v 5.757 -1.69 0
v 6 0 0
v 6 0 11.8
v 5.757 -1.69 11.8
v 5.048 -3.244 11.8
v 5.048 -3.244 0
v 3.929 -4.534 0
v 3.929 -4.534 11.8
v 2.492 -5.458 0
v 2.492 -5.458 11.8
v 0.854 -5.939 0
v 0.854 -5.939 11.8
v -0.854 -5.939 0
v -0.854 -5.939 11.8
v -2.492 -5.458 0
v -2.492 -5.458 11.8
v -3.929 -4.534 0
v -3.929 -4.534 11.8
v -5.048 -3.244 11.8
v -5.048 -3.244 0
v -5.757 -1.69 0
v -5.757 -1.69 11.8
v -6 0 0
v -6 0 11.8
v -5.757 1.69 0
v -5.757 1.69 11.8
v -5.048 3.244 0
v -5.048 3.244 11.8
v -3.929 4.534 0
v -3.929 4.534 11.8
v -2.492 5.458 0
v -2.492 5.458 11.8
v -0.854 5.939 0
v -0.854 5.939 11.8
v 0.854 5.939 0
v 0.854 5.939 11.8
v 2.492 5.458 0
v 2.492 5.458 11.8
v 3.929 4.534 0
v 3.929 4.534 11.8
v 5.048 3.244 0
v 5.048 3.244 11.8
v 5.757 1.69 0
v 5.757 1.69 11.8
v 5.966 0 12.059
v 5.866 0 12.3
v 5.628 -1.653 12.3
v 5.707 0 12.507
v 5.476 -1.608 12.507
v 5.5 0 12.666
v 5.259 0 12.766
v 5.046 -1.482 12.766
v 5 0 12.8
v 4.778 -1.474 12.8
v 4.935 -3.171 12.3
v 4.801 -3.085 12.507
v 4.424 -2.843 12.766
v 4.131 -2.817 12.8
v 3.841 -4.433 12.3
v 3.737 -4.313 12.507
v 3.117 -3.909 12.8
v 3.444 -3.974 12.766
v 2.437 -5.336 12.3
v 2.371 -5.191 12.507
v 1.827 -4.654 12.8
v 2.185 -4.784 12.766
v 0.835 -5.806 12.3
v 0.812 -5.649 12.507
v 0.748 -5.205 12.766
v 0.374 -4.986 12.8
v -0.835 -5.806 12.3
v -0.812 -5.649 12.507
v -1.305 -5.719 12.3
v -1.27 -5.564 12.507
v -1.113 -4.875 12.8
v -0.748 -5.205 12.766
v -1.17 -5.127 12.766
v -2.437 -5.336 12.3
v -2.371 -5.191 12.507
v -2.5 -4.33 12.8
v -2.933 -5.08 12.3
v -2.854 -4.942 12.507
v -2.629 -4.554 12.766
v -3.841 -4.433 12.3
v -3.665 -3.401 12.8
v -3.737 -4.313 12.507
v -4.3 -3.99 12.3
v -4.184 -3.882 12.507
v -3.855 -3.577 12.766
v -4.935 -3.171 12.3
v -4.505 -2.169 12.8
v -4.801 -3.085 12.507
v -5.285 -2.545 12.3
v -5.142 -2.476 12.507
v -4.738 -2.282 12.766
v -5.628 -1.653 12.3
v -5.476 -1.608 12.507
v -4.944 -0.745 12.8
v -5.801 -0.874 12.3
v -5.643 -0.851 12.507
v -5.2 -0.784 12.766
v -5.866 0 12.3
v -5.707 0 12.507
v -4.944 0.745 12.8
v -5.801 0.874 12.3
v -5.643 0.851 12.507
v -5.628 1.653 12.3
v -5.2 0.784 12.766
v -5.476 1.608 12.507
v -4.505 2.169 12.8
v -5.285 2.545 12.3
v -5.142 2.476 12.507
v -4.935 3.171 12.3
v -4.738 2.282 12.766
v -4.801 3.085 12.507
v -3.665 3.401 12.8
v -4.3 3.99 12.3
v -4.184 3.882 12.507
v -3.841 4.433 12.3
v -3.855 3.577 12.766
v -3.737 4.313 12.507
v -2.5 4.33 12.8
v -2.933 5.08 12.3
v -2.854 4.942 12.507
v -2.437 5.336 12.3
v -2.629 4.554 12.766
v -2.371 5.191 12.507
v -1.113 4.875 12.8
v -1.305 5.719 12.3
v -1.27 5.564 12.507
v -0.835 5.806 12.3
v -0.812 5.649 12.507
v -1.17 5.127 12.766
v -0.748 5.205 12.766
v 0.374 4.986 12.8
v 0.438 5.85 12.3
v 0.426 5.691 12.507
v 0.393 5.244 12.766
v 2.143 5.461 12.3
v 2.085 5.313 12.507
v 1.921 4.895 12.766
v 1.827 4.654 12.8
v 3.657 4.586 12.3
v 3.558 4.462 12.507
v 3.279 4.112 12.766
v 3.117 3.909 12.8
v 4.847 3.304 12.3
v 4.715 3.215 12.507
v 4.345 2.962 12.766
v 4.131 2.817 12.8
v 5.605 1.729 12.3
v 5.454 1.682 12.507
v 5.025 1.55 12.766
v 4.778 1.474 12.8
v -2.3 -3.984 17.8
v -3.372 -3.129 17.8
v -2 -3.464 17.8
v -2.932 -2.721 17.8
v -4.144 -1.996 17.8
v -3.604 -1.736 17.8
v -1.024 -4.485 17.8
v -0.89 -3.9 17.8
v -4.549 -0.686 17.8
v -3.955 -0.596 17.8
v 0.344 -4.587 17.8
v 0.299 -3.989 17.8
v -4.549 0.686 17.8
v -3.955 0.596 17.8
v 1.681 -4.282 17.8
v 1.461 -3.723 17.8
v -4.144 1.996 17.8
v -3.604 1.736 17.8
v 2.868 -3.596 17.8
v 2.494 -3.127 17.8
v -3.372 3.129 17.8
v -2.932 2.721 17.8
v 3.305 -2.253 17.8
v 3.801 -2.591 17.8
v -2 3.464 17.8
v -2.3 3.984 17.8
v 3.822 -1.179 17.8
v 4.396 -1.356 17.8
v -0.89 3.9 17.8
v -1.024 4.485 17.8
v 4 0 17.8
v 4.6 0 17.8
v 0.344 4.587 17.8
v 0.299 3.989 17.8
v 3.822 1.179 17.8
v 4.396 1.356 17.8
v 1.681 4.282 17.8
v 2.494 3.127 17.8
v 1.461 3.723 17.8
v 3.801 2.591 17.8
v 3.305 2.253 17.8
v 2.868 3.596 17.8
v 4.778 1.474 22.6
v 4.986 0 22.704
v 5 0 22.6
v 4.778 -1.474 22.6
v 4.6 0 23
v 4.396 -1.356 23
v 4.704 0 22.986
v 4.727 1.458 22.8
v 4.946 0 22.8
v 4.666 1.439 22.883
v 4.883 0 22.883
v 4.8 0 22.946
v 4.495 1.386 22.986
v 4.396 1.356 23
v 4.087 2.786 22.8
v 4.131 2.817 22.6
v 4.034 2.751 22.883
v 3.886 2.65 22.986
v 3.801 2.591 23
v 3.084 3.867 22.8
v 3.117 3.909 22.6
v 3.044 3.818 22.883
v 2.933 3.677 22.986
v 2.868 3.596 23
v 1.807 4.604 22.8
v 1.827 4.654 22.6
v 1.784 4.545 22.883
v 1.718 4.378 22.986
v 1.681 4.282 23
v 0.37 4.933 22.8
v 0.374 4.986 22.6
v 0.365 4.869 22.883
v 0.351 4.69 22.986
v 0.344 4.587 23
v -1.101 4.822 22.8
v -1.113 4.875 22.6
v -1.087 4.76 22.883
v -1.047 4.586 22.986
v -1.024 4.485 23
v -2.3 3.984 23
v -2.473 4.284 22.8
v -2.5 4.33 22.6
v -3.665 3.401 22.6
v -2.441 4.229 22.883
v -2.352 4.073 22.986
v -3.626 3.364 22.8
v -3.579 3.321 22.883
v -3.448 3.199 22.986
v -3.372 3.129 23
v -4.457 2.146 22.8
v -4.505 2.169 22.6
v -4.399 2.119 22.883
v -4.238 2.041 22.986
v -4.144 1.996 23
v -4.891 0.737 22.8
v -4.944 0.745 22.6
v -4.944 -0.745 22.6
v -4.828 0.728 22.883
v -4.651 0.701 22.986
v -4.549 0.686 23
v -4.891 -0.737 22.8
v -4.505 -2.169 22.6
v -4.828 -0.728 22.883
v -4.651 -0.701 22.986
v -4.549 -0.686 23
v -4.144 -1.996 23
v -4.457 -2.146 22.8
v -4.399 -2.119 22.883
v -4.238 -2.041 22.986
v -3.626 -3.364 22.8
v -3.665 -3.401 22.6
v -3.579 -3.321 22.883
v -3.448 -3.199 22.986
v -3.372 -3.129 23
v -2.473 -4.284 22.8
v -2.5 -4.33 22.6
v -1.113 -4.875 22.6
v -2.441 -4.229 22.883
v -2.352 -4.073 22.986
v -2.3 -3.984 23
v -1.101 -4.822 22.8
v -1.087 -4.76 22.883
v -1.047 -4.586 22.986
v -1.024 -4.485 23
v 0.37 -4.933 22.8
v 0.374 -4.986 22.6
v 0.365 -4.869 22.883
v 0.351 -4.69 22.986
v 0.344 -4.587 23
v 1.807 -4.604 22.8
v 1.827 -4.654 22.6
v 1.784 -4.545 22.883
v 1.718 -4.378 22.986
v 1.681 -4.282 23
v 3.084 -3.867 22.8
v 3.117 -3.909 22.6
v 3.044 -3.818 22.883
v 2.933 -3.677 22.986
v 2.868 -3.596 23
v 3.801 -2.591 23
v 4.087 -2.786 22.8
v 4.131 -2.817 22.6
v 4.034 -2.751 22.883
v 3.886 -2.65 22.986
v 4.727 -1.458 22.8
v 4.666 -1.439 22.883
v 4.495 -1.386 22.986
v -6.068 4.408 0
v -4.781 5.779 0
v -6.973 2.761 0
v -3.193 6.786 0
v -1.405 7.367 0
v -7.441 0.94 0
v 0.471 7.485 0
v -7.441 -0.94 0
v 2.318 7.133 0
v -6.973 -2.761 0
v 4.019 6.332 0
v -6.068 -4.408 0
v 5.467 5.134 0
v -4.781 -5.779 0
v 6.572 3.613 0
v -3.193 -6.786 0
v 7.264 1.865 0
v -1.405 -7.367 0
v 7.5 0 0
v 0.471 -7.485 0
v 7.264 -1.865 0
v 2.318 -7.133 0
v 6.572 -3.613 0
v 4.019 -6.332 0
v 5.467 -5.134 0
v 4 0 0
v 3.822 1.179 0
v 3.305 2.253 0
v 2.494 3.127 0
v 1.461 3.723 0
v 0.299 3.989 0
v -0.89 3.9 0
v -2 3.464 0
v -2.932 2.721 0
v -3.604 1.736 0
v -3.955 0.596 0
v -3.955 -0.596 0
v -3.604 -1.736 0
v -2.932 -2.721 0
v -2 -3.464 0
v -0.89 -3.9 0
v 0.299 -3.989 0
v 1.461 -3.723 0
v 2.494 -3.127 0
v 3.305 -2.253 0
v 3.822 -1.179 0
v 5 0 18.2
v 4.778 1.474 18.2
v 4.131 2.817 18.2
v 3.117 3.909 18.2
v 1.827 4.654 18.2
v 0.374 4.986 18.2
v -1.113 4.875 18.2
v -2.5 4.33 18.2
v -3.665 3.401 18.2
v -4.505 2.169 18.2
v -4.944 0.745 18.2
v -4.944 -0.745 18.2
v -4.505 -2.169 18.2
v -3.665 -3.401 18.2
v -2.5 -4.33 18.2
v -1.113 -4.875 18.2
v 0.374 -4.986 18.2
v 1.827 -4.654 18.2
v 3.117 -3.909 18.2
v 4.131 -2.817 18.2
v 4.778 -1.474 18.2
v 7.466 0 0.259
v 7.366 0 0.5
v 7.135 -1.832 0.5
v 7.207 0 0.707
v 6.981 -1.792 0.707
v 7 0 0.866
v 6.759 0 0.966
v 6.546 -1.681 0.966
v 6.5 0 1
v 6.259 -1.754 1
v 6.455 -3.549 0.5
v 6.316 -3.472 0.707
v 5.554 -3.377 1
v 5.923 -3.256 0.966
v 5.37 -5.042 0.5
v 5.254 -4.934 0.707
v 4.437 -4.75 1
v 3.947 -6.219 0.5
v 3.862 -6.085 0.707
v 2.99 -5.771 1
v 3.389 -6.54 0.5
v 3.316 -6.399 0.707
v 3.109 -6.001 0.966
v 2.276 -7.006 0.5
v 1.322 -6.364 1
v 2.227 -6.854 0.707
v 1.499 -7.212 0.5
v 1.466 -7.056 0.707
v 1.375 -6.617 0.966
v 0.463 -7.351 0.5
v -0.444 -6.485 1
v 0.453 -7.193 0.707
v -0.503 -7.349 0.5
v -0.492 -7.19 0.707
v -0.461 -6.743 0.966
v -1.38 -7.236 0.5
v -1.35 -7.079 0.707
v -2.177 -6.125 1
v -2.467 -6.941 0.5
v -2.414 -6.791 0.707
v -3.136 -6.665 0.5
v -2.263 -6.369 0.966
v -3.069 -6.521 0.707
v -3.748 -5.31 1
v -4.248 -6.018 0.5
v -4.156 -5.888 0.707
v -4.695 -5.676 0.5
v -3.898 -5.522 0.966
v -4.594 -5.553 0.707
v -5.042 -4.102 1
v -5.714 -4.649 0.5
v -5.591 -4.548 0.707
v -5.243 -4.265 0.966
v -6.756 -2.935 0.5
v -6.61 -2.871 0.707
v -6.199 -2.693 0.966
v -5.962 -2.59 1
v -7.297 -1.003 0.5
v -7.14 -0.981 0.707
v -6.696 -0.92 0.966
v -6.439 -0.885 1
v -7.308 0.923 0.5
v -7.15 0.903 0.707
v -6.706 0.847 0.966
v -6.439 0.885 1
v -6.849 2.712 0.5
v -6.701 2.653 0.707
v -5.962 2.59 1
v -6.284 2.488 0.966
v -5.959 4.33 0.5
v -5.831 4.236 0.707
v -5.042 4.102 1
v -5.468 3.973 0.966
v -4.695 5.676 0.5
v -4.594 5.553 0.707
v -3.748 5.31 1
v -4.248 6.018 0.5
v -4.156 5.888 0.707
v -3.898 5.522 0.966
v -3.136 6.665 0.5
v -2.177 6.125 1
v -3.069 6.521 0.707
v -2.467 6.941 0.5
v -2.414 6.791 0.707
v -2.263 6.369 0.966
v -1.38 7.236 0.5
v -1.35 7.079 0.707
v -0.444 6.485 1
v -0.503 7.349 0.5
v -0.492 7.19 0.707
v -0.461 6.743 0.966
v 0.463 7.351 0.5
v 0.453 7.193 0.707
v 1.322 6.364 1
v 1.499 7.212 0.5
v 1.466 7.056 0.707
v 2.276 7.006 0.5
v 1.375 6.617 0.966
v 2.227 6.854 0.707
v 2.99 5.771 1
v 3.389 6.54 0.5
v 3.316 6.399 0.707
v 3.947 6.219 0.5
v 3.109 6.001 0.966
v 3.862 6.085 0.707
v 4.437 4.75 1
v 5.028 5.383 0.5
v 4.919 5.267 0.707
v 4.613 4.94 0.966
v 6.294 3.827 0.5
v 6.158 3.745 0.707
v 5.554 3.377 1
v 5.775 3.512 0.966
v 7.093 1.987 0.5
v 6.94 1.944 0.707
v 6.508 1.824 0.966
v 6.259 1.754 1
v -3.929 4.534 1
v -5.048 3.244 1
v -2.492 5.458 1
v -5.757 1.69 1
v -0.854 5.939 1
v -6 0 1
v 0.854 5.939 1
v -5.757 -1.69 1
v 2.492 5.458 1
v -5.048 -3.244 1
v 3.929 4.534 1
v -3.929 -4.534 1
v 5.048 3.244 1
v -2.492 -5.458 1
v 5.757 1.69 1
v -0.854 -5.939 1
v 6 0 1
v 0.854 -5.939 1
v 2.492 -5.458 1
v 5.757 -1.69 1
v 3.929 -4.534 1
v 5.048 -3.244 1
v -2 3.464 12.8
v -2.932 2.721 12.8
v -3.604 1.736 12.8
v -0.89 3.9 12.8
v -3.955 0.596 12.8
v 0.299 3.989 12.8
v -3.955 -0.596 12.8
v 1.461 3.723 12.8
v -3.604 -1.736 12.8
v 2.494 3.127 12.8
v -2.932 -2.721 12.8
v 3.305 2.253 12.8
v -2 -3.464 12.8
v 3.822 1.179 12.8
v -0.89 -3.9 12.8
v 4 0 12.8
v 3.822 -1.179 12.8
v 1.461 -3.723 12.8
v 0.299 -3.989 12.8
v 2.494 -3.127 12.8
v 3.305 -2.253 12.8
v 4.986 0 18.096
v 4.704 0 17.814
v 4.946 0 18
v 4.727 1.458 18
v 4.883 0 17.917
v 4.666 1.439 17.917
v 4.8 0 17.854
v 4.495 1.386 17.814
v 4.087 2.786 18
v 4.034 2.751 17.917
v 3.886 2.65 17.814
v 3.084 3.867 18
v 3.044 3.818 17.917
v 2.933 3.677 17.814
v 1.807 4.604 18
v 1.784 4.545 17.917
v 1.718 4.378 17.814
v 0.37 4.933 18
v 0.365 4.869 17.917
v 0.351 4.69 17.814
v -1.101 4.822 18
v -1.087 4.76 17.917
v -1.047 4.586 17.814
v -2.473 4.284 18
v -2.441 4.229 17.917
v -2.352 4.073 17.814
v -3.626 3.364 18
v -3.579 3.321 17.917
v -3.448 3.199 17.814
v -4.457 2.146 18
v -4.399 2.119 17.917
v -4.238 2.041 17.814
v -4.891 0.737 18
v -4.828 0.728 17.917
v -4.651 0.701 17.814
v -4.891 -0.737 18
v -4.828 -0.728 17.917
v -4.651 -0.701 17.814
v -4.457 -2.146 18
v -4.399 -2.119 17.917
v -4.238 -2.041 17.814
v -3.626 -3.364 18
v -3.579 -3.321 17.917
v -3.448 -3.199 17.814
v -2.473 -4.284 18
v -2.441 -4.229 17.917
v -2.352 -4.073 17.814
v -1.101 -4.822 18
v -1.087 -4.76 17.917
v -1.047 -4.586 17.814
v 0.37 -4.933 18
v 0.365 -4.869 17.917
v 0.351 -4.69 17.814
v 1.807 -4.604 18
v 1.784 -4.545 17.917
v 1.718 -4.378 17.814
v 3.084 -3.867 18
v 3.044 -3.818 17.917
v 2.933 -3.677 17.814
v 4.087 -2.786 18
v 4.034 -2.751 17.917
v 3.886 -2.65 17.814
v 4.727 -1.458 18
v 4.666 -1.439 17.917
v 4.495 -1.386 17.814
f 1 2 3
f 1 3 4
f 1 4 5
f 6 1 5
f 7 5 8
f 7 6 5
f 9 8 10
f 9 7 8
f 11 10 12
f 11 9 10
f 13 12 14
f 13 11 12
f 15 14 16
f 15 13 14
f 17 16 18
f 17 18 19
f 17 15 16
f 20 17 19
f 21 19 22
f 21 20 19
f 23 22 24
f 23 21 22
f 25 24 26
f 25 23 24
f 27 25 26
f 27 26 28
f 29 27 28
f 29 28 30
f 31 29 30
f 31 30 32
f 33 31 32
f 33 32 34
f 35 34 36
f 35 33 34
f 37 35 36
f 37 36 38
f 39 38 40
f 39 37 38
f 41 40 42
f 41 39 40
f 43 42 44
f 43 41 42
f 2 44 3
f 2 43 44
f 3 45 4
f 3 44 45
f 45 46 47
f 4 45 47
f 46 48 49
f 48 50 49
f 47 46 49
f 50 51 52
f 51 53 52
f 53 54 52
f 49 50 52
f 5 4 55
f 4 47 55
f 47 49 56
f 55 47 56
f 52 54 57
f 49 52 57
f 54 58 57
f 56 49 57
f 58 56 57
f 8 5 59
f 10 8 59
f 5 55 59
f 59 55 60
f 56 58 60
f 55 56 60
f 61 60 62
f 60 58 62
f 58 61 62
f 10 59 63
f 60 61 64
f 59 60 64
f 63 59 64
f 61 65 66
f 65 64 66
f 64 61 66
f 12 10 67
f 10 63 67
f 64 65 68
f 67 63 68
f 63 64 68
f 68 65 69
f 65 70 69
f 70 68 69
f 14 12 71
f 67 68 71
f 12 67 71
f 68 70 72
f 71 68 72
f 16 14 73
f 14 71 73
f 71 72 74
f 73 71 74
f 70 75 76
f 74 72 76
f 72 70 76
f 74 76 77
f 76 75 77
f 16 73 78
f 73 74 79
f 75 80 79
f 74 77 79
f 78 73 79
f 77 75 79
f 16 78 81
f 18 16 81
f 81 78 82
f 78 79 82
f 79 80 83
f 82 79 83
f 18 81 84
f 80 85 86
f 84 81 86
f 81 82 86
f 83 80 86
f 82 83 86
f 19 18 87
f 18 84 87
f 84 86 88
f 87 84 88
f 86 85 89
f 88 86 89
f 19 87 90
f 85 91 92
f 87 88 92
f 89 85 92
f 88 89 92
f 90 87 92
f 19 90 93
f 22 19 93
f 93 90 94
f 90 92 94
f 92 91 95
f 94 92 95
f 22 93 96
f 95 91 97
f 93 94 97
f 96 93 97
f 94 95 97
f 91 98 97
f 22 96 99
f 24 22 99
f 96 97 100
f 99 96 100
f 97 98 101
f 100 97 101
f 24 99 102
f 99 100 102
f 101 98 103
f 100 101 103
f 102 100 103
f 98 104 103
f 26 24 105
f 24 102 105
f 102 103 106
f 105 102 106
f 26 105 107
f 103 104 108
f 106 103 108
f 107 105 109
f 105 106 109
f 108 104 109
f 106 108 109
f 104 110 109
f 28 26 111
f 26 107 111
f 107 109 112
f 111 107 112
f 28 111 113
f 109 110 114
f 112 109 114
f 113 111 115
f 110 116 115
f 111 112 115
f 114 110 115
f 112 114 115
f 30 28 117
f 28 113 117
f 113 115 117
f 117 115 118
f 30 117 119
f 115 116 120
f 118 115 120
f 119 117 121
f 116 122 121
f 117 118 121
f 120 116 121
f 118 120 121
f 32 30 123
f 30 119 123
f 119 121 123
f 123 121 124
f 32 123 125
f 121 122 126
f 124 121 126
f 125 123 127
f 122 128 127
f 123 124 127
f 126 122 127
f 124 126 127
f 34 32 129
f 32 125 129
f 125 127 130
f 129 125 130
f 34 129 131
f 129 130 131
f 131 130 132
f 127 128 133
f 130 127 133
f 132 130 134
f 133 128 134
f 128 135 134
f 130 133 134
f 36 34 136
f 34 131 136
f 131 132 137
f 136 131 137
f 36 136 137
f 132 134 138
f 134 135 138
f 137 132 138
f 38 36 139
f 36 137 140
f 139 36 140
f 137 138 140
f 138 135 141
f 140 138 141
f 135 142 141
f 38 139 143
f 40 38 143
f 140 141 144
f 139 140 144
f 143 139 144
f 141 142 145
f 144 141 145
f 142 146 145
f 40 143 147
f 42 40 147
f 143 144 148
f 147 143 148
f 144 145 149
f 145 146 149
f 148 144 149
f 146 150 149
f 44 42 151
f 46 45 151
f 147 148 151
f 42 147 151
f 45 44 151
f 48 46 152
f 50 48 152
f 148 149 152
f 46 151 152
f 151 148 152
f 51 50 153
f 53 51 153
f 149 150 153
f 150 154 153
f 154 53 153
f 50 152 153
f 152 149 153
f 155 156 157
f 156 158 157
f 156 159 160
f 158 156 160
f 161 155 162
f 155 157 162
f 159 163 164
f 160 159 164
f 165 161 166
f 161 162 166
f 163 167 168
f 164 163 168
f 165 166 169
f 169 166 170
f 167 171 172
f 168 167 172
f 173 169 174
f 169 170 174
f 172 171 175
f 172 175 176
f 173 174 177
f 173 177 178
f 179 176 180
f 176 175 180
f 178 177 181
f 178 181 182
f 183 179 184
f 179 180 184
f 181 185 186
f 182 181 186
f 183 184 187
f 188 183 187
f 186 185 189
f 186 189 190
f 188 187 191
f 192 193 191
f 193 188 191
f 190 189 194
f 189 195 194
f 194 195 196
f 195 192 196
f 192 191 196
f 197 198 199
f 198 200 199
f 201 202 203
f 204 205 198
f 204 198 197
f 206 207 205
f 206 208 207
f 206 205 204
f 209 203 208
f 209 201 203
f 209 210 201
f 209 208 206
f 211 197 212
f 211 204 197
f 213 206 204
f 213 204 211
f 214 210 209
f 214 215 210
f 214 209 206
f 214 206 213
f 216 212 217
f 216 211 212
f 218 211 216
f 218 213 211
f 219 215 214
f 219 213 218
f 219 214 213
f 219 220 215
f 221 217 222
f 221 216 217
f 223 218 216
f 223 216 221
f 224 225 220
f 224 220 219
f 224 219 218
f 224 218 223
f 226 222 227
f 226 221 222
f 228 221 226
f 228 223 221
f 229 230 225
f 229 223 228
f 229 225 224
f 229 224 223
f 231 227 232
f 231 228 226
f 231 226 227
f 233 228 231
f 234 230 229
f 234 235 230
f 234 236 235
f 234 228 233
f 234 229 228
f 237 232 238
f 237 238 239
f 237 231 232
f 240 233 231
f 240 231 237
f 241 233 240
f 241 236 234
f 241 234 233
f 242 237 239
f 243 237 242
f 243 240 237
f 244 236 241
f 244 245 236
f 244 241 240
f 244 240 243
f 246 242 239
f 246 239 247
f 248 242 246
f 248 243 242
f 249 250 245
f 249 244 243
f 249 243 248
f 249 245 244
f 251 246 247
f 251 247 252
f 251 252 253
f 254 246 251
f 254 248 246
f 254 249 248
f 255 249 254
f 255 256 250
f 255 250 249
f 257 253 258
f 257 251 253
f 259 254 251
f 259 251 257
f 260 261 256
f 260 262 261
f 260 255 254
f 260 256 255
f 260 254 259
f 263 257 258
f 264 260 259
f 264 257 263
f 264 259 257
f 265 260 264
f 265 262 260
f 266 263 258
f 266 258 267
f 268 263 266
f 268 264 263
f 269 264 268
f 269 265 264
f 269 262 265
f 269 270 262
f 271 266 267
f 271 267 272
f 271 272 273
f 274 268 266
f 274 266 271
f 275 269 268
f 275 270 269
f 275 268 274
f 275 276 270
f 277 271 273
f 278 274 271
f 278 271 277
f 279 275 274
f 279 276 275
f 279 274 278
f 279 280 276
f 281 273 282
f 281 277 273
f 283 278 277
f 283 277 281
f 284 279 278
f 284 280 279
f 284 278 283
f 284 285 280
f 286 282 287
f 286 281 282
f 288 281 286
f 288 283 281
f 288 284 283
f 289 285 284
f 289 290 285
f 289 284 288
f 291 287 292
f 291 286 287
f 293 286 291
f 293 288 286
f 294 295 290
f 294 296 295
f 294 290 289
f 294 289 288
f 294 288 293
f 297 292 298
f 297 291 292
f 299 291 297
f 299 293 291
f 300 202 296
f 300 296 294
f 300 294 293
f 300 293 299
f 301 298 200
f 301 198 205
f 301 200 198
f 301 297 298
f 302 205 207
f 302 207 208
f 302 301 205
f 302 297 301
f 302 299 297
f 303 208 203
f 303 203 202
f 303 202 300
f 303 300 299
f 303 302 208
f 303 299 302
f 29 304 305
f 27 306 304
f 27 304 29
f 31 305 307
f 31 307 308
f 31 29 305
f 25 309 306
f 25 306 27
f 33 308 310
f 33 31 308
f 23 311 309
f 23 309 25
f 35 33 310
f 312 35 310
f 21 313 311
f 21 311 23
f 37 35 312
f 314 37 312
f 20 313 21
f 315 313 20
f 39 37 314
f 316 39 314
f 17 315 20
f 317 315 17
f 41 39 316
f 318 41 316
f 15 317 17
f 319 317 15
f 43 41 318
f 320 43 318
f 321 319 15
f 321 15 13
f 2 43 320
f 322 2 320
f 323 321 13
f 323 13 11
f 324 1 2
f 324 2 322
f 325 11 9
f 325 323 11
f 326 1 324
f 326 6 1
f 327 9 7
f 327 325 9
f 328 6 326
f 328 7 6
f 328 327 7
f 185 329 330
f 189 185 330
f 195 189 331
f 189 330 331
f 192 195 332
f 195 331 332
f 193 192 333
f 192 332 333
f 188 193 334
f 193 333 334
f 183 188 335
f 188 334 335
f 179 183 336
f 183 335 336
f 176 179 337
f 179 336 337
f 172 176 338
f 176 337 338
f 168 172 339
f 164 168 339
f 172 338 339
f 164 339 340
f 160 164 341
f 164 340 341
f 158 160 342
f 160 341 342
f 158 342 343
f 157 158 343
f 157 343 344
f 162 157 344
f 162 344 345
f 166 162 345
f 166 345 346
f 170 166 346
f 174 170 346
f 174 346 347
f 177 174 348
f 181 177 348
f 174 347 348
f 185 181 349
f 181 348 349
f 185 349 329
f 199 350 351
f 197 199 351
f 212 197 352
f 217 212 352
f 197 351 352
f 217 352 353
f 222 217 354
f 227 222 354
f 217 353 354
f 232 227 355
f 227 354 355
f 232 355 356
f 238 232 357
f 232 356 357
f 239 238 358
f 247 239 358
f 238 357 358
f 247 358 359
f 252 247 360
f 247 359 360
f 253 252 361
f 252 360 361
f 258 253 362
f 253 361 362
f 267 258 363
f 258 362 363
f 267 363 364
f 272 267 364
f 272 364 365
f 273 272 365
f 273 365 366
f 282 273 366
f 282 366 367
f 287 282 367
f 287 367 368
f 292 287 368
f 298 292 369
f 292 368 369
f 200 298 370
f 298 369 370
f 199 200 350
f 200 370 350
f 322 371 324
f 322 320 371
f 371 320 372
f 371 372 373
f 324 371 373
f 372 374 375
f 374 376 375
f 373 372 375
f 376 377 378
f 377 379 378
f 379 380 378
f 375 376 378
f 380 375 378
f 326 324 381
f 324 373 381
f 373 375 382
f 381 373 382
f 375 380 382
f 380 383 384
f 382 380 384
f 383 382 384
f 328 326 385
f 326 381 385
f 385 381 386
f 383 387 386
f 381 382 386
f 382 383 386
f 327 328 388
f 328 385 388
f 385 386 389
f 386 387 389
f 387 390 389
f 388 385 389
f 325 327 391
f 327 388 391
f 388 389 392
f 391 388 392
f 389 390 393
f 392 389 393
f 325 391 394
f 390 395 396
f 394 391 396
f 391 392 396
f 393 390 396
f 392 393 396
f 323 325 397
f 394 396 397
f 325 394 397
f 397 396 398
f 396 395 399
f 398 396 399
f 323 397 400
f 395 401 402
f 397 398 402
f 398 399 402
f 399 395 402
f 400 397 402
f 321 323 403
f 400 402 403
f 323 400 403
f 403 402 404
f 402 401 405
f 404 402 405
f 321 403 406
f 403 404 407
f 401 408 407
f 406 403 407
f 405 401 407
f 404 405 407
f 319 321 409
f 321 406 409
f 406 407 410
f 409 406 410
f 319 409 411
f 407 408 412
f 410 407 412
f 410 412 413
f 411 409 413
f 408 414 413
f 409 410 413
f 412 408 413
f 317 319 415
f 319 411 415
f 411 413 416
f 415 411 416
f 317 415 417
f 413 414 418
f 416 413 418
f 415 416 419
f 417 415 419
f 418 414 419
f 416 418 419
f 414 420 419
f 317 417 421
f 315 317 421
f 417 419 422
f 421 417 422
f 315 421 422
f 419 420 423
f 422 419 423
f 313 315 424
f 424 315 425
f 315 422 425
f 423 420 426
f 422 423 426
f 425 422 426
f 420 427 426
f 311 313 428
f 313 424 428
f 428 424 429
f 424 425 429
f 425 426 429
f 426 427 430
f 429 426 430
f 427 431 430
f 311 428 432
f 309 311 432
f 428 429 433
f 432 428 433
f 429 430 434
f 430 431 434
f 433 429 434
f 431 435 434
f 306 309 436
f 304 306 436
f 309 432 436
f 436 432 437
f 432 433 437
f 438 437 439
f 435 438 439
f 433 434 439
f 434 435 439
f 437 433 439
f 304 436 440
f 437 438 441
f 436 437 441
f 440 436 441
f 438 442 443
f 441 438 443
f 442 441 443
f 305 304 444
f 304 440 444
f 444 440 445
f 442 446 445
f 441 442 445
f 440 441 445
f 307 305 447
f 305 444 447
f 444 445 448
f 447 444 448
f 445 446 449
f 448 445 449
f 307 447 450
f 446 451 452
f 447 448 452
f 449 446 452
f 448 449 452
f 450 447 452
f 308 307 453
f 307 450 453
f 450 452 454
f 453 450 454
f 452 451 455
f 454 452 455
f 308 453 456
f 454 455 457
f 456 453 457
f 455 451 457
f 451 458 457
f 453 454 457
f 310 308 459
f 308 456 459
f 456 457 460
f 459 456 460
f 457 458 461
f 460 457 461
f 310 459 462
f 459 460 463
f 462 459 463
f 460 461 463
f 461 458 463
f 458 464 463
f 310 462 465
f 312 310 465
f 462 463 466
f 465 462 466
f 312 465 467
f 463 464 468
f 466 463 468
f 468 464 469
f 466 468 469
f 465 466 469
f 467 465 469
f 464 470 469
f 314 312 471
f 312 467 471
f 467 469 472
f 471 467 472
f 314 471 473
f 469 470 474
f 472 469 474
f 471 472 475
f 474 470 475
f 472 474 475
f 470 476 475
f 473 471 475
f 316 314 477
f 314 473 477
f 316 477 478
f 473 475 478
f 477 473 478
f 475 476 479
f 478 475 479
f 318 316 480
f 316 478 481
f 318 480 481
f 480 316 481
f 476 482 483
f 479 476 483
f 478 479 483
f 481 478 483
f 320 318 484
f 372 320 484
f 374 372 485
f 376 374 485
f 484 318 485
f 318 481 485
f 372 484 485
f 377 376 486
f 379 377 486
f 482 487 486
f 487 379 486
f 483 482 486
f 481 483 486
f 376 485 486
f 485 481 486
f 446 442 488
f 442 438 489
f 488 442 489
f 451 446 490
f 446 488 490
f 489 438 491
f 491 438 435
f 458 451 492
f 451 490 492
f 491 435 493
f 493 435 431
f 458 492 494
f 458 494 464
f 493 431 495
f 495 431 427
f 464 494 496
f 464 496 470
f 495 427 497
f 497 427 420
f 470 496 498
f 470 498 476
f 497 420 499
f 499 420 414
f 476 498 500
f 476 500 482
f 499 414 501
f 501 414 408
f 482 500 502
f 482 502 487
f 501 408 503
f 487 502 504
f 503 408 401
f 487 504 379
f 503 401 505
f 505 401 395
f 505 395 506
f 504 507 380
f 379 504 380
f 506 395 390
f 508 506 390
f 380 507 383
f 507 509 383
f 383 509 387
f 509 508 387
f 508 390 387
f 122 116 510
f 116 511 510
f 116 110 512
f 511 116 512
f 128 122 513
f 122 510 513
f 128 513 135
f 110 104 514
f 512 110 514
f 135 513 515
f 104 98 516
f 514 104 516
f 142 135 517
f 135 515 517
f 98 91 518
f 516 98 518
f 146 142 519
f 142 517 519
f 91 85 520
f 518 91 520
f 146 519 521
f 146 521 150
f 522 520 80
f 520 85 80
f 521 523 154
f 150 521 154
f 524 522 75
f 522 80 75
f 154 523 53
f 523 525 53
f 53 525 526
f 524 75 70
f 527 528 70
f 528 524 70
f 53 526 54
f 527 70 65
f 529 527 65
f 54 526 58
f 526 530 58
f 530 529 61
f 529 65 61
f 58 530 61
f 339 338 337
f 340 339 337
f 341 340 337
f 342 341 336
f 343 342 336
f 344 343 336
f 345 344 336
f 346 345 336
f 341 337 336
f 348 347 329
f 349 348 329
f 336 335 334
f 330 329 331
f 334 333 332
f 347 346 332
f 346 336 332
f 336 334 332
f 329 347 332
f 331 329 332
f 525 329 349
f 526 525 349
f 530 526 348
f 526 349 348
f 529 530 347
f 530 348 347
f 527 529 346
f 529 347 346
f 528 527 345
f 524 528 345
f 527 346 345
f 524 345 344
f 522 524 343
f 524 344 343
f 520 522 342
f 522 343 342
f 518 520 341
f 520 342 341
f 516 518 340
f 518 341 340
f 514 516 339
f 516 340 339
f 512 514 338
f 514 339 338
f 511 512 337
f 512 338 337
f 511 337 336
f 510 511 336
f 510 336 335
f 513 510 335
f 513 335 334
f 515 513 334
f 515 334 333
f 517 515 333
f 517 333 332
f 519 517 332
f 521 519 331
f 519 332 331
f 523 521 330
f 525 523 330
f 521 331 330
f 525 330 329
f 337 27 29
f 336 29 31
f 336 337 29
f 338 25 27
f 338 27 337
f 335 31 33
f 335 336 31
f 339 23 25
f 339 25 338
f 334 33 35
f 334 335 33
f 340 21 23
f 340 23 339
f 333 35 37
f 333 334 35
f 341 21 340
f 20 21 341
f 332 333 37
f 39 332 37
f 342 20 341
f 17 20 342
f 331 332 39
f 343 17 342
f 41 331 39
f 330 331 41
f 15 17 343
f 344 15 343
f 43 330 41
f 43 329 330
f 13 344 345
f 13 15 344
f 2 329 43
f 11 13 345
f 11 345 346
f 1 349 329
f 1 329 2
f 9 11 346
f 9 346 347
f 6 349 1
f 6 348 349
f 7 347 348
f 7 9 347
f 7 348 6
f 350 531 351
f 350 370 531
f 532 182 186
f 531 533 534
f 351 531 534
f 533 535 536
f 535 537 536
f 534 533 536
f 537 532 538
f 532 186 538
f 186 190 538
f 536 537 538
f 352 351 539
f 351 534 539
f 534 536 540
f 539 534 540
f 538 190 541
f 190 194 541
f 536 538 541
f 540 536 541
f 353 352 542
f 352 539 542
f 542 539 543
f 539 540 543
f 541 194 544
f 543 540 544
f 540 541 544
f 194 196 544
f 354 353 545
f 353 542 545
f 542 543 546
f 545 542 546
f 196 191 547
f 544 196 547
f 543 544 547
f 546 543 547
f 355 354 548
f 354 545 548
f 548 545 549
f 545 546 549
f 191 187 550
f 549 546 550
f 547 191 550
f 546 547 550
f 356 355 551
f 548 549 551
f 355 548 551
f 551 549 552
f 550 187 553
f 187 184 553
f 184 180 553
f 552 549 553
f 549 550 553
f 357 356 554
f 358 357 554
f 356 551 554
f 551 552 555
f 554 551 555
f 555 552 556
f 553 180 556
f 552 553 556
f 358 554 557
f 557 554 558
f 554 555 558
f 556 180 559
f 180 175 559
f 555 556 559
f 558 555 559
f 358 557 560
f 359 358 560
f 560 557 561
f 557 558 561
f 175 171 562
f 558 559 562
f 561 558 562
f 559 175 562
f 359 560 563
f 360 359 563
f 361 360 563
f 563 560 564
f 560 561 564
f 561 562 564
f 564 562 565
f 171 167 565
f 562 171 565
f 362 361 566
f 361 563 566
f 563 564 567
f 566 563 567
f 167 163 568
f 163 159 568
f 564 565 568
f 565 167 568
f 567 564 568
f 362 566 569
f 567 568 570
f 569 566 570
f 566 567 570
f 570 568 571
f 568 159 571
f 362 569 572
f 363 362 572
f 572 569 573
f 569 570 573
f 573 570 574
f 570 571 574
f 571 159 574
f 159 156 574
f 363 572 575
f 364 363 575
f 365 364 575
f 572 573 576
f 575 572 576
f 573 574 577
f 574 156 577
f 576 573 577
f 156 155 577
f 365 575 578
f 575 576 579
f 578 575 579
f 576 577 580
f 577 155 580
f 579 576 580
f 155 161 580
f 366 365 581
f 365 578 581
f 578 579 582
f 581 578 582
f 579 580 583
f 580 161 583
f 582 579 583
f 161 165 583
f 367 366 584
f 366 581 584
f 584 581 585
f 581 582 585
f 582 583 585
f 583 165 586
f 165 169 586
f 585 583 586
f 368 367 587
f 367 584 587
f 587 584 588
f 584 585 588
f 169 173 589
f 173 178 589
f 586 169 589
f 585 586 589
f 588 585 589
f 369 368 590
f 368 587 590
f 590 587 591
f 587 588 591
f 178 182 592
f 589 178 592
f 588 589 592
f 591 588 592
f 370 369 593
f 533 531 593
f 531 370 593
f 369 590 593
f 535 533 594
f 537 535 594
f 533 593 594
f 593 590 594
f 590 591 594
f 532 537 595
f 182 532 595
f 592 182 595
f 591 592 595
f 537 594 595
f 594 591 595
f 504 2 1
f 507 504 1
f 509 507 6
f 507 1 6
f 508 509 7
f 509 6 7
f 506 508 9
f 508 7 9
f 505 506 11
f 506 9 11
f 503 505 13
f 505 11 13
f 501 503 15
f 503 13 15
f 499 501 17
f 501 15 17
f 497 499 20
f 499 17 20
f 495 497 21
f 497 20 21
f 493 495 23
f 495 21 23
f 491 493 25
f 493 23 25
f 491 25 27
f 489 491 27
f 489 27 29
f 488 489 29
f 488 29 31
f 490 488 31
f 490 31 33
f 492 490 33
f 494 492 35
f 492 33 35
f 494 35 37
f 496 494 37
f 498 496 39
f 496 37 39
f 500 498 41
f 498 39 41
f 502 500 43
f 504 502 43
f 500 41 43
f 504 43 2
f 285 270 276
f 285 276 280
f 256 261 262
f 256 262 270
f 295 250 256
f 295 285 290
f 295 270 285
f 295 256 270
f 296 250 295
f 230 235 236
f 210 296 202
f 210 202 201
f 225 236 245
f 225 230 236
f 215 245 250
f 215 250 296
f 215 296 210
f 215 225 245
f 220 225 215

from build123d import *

# Parameters (mm, degrees)
F0_R     = 4
F1_DEPTH = 17.8
F2_R     = 5
F2_R_2   = 4
F3_DEPTH = 5.2
F4_R     = 0.4
F5_R     = 6
F5_R_2   = 4
F6_DEPTH = 12.8
F7_R     = 7.5
F7_R_2   = 6
F8_DEPTH = 1
F9_R     = 0.99999
F10_R    = 1


# Not quite as in the source:
# - a fillet or chamfer is up to 0.001 mm smaller than in the source, because OpenCascade refuses the exact size


with BuildPart() as f1:
    # F0 (on Top) → F1 (new body)
    with BuildSketch(Plane.XY):
        Circle(F0_R)
    extrude(amount=F1_DEPTH)

    # F2 (on face) → F3 (join)
    with BuildSketch(Plane.XY.offset(17.8)):
        Circle(F2_R)
        Circle(F2_R_2, mode=Mode.SUBTRACT)
        Circle(F2_R_2)
    extrude(amount=F3_DEPTH)

    # F4
    f4_edges = [f1.edges().sort_by_distance(p)[0] for p in [
        (-5, 0, 23),
        (-5, 0, 17.8),
    ]]
    fillet(f4_edges, radius=F4_R)


with BuildPart() as f6:
    # F5 (on face) → F6 (new body)
    with BuildSketch(Plane(origin=(0, 0, 0), x_dir=(1, 0, 0), z_dir=(0, 0, -1))):
        Circle(F5_R)
        Circle(F5_R_2, mode=Mode.SUBTRACT)
    extrude(amount=-F6_DEPTH)

    # F10
    f10_edges = [f6.edges().sort_by_distance(p)[0] for p in [
        (-6, 0, 12.8),
    ]]
    fillet(f10_edges, radius=F10_R)


with BuildPart() as f8:
    # F7 (on face) → F8 (new body)
    with BuildSketch(Plane(origin=(0, 0, 0), x_dir=(1, 0, 0), z_dir=(0, 0, -1))):
        Circle(F7_R)
        Circle(F7_R_2, mode=Mode.SUBTRACT)
    extrude(amount=-F8_DEPTH)

    # F9 (radius 1 in the source; OpenCascade refuses exactly that, so slightly less here)
    f9_edges = [f8.edges().sort_by_distance(p)[0] for p in [
        (-7.5, 0, 1),
    ]]
    fillet(f9_edges, radius=F9_R)


solid = Compound([f1.part, f6.part, f8.part])
